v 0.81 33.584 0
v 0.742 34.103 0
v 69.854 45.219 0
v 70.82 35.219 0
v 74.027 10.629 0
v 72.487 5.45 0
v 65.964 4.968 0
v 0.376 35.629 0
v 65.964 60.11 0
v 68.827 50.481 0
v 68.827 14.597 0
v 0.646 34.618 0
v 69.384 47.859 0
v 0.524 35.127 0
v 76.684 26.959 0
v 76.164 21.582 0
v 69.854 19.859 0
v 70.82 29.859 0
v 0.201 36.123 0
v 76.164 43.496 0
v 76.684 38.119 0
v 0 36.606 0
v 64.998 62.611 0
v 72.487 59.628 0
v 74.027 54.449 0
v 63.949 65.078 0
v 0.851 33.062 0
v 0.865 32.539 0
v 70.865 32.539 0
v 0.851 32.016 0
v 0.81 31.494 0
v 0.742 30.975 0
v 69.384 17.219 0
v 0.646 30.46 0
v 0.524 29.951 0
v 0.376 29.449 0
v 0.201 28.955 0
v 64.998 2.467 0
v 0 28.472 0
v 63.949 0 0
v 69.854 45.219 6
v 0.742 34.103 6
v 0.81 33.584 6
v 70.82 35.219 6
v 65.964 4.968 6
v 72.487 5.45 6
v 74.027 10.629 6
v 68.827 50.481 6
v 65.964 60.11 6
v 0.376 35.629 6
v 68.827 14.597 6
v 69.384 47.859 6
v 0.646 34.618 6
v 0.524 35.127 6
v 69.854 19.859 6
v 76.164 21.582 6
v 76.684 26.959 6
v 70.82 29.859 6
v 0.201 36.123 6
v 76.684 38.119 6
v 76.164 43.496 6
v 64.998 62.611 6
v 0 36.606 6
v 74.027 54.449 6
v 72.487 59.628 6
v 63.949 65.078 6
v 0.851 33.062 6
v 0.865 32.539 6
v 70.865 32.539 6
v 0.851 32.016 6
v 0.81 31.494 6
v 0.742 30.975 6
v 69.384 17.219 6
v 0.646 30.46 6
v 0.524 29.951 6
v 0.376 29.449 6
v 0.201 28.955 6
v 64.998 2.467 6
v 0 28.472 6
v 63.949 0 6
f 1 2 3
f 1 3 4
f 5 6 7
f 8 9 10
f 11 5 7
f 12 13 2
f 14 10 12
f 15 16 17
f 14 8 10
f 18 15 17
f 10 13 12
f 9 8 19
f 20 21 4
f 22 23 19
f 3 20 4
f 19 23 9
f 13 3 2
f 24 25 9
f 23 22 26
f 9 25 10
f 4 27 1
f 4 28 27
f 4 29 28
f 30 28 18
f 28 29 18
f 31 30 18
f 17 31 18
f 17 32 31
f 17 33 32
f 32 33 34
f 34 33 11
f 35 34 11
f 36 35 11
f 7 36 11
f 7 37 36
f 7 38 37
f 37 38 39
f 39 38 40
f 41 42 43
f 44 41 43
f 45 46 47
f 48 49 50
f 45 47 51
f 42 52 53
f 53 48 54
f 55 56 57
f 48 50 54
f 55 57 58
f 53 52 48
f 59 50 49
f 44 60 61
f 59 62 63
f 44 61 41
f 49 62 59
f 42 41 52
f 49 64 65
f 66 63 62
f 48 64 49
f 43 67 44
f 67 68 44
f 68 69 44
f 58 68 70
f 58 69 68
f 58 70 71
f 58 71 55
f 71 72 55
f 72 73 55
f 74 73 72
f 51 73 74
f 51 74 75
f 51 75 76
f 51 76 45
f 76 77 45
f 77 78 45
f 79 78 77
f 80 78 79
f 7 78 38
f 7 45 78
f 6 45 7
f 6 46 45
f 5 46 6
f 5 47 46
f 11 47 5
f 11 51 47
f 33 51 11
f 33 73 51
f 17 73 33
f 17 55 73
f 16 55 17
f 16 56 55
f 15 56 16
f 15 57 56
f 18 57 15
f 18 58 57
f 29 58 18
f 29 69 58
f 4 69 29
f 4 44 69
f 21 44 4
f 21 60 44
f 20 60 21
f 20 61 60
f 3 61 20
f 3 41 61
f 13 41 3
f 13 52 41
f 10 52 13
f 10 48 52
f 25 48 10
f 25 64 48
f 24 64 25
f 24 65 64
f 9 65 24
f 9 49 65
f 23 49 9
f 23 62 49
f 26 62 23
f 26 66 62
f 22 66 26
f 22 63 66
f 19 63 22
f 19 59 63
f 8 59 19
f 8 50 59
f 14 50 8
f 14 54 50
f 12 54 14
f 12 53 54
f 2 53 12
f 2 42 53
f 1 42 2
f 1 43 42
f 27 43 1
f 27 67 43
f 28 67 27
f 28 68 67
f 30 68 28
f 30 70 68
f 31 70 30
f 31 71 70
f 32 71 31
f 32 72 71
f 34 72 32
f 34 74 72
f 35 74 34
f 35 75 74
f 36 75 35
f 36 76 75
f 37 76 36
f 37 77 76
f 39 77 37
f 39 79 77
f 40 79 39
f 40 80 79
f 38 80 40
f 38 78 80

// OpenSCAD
$fn = 32;

// ----------------------------------------------------------------------
// Gear sector: 4 teeth on 48 degrees
// ----------------------------------------------------------------------

// --- parameters (mm) ---
sector_angle = 48;        // sector angle, degrees
root_r = 80;              // root circle radius
tooth_h = 6;              // tooth height over the root circle
teeth = 4;                // number of teeth on the sector
hub_r = 10;               // hub bore radius
plate_t = 6;              // sector thickness, Z
arc_step = 3;             // sampling step of the root/hub arcs, degrees

tip_r = root_r + tooth_h;  // tip circle radius

profile = [[63.949, 0], [64.998, 2.467], [65.964, 4.968], [72.487, 5.45], [74.027, 10.629], [68.827, 14.597], [69.384, 17.219], [69.854, 19.859], [76.164, 21.582], [76.684, 26.959], [70.82, 29.859], [70.865, 32.539], [70.82, 35.219], [76.684, 38.119], [76.164, 43.496], [69.854, 45.219], [69.384, 47.859], [68.827, 50.481], [74.027, 54.449], [72.487, 59.628], [65.964, 60.11], [64.998, 62.611], [63.949, 65.078], [0, 36.606], [0.201, 36.123], [0.376, 35.629], [0.524, 35.127], [0.646, 34.618], [0.742, 34.103], [0.81, 33.584], [0.851, 33.062], [0.865, 32.539], [0.851, 32.016], [0.81, 31.494], [0.742, 30.975], [0.646, 30.46], [0.524, 29.951], [0.376, 29.449], [0.201, 28.955], [0, 28.472]];  // primary outline, 40 points, counter clockwise

// --- the one profile operation ---
linear_extrude(height = plate_t) polygon(points = profile);
